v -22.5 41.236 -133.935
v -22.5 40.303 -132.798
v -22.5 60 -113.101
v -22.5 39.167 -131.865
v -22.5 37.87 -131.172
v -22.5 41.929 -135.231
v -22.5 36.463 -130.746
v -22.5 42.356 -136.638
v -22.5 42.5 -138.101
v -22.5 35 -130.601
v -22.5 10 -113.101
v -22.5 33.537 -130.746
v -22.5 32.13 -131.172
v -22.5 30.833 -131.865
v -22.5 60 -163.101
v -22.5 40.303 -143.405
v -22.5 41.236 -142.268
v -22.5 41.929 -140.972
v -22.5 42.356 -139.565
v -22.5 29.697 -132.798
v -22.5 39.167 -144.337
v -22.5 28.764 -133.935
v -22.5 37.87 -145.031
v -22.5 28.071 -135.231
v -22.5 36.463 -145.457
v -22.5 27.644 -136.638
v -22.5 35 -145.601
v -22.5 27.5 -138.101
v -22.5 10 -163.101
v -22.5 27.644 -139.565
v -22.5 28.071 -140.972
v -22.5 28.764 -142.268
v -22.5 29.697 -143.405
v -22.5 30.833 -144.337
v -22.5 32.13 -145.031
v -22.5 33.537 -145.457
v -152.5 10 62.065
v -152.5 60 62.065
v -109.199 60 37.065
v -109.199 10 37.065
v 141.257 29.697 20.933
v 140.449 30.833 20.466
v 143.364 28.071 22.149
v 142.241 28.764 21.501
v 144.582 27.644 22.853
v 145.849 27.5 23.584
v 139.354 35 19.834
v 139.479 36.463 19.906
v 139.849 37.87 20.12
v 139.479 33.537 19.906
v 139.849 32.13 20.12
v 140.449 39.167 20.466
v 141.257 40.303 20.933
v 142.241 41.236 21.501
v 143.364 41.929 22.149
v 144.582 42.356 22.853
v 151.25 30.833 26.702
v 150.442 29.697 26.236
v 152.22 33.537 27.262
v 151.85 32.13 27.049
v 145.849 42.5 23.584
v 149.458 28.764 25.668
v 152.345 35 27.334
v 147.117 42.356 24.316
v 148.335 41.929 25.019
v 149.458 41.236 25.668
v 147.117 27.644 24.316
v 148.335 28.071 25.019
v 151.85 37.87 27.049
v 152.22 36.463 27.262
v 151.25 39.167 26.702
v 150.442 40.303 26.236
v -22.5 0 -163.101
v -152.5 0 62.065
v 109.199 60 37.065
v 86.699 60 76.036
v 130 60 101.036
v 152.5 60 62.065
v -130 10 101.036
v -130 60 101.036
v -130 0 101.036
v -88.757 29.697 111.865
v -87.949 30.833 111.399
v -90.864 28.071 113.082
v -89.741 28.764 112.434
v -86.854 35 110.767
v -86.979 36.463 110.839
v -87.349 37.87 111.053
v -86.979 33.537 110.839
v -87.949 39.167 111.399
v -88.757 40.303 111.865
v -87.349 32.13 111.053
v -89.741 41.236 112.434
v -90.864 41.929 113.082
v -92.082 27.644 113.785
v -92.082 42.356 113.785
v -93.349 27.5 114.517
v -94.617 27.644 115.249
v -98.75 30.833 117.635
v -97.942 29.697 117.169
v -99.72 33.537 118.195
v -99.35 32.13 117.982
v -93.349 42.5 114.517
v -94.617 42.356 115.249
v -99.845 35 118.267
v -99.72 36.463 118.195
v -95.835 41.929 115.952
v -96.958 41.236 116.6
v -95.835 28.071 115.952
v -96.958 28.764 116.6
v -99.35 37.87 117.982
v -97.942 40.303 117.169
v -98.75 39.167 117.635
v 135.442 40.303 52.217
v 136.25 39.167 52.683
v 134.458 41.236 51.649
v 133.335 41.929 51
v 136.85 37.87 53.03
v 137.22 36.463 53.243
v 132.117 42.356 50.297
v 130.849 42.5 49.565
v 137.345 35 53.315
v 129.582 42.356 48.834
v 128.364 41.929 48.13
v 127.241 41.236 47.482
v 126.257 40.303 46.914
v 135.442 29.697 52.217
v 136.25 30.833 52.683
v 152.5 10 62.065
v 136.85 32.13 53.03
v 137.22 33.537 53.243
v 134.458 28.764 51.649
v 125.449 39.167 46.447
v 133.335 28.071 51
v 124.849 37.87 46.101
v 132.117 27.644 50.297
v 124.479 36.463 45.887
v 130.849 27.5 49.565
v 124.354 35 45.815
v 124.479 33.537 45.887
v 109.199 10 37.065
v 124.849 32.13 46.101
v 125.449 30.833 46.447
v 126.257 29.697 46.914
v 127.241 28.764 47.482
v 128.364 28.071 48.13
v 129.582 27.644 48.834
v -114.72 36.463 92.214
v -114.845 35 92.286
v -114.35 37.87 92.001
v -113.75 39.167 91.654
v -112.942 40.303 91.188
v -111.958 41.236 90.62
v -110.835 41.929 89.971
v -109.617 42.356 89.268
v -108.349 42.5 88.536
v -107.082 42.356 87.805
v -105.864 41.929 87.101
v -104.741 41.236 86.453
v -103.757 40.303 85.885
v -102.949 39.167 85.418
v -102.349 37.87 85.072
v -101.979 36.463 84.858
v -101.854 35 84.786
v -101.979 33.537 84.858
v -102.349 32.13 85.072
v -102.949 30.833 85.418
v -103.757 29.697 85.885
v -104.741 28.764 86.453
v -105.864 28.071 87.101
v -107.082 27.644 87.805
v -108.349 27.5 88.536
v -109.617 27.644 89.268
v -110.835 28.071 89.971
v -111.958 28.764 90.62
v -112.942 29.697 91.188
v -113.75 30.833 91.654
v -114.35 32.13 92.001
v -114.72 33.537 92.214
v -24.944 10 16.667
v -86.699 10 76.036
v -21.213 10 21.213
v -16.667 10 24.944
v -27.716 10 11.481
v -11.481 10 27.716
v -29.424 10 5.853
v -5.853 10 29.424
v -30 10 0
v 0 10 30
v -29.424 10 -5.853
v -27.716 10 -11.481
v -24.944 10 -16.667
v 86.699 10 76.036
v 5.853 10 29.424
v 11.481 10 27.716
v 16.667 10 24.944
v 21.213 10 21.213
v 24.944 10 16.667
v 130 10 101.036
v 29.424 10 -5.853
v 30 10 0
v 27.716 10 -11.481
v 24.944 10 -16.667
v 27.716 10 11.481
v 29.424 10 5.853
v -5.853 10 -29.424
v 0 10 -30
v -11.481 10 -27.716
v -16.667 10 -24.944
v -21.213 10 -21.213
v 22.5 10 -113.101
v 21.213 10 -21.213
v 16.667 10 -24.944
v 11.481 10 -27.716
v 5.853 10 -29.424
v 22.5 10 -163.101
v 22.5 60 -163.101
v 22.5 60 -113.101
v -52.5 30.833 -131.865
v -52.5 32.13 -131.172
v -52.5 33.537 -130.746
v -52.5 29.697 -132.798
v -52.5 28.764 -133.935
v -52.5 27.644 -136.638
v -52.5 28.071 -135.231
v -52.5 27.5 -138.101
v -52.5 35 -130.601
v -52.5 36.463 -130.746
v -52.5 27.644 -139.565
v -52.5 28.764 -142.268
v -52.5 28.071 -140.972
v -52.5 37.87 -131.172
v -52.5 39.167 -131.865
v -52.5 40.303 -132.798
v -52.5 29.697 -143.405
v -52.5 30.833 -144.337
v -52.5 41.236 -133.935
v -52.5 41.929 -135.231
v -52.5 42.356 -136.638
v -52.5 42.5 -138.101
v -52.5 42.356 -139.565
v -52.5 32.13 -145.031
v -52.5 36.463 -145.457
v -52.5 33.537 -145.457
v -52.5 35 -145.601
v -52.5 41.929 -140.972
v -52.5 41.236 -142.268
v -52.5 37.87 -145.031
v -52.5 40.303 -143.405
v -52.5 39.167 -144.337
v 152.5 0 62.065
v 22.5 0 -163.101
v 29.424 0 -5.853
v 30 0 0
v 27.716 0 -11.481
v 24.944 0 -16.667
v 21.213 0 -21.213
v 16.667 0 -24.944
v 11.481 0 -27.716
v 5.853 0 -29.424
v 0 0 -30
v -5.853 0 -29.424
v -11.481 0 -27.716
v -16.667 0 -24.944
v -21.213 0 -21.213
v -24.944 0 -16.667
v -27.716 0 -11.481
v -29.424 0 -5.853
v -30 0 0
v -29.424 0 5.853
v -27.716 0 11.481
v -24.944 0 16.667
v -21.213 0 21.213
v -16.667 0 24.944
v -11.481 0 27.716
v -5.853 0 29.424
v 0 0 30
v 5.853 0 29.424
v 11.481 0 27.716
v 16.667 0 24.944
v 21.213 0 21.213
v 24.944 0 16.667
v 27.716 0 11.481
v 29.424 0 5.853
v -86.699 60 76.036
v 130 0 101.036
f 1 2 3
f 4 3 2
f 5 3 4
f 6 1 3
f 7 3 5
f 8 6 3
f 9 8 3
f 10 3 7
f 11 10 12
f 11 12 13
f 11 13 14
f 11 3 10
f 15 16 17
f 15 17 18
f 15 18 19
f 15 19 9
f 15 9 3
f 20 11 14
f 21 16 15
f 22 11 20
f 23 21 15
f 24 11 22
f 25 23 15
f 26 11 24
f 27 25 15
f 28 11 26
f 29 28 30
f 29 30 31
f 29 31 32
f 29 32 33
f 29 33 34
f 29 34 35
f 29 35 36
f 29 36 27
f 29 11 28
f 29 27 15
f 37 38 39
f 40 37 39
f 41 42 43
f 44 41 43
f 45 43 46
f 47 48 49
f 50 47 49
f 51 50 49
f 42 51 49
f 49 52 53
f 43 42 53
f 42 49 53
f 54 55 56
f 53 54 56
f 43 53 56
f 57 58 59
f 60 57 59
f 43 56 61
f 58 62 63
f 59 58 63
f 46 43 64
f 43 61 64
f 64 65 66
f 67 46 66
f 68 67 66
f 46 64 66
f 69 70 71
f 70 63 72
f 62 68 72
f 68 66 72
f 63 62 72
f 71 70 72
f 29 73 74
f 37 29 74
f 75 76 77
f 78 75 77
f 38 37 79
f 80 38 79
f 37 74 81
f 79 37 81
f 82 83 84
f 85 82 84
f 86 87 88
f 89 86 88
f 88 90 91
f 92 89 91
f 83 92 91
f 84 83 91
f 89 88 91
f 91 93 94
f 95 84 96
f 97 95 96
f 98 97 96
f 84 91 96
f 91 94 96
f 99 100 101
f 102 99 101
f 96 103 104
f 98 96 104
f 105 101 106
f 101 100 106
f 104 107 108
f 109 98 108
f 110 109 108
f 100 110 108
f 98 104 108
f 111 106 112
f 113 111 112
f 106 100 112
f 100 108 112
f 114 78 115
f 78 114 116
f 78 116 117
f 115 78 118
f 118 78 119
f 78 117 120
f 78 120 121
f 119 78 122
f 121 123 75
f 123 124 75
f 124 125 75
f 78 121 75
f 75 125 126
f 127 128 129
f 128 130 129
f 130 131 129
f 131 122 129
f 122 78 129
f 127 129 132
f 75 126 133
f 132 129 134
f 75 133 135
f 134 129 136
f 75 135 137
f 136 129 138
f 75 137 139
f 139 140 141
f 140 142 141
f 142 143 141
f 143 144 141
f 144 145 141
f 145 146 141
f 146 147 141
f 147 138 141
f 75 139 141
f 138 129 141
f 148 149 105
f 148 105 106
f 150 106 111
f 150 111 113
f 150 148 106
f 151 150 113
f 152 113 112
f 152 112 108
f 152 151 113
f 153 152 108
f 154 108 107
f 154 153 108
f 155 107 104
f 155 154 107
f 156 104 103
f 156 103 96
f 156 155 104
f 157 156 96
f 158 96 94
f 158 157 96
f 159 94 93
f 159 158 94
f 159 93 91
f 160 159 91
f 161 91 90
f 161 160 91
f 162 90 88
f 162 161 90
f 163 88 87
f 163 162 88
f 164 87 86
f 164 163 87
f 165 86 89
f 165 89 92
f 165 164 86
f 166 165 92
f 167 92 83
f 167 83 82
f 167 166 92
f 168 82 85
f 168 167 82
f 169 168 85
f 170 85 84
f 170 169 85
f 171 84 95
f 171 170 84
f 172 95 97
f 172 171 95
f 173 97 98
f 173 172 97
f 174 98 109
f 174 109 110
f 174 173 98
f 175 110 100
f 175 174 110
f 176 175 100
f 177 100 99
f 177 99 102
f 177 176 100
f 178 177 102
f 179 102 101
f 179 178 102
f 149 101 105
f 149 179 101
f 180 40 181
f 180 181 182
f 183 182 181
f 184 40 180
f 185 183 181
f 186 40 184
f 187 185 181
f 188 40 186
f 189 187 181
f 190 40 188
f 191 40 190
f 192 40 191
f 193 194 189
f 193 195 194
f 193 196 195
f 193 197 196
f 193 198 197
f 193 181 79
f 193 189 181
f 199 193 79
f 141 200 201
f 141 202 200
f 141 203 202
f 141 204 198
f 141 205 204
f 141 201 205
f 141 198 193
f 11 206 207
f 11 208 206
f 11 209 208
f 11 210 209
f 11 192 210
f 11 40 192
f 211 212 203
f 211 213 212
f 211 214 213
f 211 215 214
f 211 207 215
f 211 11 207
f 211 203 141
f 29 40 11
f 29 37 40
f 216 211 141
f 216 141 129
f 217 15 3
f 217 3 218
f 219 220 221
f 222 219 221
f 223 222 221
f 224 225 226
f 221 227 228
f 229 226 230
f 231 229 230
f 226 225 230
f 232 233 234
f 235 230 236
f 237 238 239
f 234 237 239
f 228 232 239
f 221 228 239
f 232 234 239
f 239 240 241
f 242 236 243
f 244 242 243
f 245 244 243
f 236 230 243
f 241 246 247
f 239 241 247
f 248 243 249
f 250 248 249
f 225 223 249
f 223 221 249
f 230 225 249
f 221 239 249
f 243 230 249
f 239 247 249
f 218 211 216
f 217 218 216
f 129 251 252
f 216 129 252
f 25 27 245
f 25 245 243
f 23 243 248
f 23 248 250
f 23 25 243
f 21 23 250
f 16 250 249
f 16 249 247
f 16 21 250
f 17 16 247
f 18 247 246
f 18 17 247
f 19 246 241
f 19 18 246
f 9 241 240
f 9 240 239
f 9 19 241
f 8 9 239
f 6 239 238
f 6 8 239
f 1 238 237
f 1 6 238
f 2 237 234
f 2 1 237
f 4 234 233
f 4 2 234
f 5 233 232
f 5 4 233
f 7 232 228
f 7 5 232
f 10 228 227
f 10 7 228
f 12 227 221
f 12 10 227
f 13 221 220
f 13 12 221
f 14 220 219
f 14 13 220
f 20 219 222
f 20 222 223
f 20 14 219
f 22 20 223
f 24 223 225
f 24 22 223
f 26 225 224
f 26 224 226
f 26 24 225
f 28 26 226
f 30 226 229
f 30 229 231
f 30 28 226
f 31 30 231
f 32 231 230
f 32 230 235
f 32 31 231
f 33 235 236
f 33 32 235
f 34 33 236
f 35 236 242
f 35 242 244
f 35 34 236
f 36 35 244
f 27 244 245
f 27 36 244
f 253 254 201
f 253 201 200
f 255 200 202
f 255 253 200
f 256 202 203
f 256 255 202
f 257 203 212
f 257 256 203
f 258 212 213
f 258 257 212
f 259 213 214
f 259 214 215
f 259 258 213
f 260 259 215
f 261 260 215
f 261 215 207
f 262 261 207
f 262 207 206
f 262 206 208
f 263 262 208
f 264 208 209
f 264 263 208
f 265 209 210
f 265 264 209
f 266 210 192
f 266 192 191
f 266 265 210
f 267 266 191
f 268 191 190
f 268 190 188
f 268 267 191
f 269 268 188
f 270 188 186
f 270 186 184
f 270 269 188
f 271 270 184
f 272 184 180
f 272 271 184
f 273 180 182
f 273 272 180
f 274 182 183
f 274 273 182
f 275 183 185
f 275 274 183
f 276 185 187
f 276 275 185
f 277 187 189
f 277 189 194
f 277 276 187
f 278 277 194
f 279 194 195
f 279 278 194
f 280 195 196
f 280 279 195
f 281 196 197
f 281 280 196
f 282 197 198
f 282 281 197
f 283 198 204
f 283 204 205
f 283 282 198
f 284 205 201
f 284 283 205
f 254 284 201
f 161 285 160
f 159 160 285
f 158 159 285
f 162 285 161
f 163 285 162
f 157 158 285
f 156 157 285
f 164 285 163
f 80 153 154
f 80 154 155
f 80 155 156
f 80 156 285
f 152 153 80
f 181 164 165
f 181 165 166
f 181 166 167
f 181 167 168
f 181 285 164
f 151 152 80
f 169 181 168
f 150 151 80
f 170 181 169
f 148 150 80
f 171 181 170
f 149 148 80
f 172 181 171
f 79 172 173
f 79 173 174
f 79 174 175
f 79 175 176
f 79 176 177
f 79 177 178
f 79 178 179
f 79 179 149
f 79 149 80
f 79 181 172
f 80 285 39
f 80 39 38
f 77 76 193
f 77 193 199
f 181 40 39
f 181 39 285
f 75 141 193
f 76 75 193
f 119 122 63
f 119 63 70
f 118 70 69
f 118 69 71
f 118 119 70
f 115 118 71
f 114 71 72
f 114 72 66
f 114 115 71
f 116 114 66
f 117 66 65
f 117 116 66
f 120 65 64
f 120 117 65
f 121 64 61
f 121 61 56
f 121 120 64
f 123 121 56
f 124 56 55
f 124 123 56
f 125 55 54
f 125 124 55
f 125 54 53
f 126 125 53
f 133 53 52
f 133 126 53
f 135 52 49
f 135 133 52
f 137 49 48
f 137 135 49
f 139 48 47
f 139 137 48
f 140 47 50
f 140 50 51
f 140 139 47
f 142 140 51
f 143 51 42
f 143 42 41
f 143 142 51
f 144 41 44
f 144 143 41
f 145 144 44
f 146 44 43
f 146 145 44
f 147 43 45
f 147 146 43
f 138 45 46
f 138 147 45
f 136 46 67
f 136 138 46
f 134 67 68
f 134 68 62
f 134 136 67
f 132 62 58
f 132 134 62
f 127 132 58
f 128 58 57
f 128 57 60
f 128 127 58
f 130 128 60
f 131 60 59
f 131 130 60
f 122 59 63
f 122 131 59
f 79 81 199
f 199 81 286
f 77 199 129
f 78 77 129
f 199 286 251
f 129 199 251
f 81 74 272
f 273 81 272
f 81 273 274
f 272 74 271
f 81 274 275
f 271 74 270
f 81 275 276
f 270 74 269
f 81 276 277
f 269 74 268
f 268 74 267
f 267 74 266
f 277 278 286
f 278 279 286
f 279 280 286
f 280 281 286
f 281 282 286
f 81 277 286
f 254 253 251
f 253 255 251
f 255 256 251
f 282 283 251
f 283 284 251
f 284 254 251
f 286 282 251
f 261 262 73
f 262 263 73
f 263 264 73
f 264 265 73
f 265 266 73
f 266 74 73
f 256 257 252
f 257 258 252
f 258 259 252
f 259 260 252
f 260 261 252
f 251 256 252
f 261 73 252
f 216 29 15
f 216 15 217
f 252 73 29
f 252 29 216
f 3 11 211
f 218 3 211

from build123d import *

# Parameters (mm, degrees)
SKETCH1_R           = 30
BOSS_EXTRUDE1_DEPTH = 10
SKETCH2_W           = 45
SKETCH2_H           = 50
BOSS_EXTRUDE2_DEPTH = 50
SKETCH3_R           = 7.5
BOSS_EXTRUDE3_DEPTH = 30
SKETCH4_R           = 7.5
BOSS_EXTRUDE4_DEPTH = 30
SKETCH5_R           = 7.5
BOSS_EXTRUDE5_DEPTH = 30


with BuildPart() as part:
    # Sketch1 → Boss-Extrude1 (new body)
    with BuildSketch(Plane(origin=(0, 0, 0), x_dir=(1, 0, 0), z_dir=(0, 1, 0))):
        Polygon((-152.5, -62.065153938), (-130, -101.036297108), (130, -101.036297108), (152.5, -62.065153938), (22.5, 163.101451046), (-22.5, 163.101451046), align=None)
        Circle(SKETCH1_R, mode=Mode.SUBTRACT)
    extrude(amount=BOSS_EXTRUDE1_DEPTH)

    # Sketch2 → Boss-Extrude2 (add)
    with BuildSketch(Plane(origin=(0, 10, 0), x_dir=(1, 0, 0), z_dir=(0, 1, 0))):
        with Locations((0, 138.101451046)):
            Rectangle(SKETCH2_W, SKETCH2_H)
        Polygon((-86.698729811, -76.036297108), (-130, -101.036297108), (-152.5, -62.065153938), (-109.198729811, -37.065153938), align=None)
        Polygon((86.698729811, -76.036297108), (130, -101.036297108), (152.5, -62.065153938), (109.198729811, -37.065153938), align=None)
    extrude(amount=BOSS_EXTRUDE2_DEPTH)

    # Sketch3 → Boss-Extrude3 (add)
    with BuildSketch(Plane(origin=(-22.5, 0, -140.601451046), x_dir=(0, 0, -1), z_dir=(1, 0, 0))):
        with Locations((-2.5, 35)):
            Circle(SKETCH3_R)
    extrude(amount=-BOSS_EXTRUDE3_DEPTH)

    # Sketch4 → Boss-Extrude4 (add)
    with BuildSketch(Plane(origin=(133.014428415, 0, 50.815153938), x_dir=(0.866025404, 0, 0.5), z_dir=(-0.5, 0, 0.866025404))):
        with Locations((-2.5, 35)):
            Circle(SKETCH4_R)
    extrude(amount=-BOSS_EXTRUDE4_DEPTH)

    # Sketch5 → Boss-Extrude5 (add)
    with BuildSketch(Plane(origin=(-110.514428415, 0, 89.786297108), x_dir=(-0.866025404, 0, 0.5), z_dir=(-0.5, 0, -0.866025404))):
        with Locations((-2.5, 35)):
            Circle(SKETCH5_R)
    extrude(amount=-BOSS_EXTRUDE5_DEPTH)


solid = part.part
